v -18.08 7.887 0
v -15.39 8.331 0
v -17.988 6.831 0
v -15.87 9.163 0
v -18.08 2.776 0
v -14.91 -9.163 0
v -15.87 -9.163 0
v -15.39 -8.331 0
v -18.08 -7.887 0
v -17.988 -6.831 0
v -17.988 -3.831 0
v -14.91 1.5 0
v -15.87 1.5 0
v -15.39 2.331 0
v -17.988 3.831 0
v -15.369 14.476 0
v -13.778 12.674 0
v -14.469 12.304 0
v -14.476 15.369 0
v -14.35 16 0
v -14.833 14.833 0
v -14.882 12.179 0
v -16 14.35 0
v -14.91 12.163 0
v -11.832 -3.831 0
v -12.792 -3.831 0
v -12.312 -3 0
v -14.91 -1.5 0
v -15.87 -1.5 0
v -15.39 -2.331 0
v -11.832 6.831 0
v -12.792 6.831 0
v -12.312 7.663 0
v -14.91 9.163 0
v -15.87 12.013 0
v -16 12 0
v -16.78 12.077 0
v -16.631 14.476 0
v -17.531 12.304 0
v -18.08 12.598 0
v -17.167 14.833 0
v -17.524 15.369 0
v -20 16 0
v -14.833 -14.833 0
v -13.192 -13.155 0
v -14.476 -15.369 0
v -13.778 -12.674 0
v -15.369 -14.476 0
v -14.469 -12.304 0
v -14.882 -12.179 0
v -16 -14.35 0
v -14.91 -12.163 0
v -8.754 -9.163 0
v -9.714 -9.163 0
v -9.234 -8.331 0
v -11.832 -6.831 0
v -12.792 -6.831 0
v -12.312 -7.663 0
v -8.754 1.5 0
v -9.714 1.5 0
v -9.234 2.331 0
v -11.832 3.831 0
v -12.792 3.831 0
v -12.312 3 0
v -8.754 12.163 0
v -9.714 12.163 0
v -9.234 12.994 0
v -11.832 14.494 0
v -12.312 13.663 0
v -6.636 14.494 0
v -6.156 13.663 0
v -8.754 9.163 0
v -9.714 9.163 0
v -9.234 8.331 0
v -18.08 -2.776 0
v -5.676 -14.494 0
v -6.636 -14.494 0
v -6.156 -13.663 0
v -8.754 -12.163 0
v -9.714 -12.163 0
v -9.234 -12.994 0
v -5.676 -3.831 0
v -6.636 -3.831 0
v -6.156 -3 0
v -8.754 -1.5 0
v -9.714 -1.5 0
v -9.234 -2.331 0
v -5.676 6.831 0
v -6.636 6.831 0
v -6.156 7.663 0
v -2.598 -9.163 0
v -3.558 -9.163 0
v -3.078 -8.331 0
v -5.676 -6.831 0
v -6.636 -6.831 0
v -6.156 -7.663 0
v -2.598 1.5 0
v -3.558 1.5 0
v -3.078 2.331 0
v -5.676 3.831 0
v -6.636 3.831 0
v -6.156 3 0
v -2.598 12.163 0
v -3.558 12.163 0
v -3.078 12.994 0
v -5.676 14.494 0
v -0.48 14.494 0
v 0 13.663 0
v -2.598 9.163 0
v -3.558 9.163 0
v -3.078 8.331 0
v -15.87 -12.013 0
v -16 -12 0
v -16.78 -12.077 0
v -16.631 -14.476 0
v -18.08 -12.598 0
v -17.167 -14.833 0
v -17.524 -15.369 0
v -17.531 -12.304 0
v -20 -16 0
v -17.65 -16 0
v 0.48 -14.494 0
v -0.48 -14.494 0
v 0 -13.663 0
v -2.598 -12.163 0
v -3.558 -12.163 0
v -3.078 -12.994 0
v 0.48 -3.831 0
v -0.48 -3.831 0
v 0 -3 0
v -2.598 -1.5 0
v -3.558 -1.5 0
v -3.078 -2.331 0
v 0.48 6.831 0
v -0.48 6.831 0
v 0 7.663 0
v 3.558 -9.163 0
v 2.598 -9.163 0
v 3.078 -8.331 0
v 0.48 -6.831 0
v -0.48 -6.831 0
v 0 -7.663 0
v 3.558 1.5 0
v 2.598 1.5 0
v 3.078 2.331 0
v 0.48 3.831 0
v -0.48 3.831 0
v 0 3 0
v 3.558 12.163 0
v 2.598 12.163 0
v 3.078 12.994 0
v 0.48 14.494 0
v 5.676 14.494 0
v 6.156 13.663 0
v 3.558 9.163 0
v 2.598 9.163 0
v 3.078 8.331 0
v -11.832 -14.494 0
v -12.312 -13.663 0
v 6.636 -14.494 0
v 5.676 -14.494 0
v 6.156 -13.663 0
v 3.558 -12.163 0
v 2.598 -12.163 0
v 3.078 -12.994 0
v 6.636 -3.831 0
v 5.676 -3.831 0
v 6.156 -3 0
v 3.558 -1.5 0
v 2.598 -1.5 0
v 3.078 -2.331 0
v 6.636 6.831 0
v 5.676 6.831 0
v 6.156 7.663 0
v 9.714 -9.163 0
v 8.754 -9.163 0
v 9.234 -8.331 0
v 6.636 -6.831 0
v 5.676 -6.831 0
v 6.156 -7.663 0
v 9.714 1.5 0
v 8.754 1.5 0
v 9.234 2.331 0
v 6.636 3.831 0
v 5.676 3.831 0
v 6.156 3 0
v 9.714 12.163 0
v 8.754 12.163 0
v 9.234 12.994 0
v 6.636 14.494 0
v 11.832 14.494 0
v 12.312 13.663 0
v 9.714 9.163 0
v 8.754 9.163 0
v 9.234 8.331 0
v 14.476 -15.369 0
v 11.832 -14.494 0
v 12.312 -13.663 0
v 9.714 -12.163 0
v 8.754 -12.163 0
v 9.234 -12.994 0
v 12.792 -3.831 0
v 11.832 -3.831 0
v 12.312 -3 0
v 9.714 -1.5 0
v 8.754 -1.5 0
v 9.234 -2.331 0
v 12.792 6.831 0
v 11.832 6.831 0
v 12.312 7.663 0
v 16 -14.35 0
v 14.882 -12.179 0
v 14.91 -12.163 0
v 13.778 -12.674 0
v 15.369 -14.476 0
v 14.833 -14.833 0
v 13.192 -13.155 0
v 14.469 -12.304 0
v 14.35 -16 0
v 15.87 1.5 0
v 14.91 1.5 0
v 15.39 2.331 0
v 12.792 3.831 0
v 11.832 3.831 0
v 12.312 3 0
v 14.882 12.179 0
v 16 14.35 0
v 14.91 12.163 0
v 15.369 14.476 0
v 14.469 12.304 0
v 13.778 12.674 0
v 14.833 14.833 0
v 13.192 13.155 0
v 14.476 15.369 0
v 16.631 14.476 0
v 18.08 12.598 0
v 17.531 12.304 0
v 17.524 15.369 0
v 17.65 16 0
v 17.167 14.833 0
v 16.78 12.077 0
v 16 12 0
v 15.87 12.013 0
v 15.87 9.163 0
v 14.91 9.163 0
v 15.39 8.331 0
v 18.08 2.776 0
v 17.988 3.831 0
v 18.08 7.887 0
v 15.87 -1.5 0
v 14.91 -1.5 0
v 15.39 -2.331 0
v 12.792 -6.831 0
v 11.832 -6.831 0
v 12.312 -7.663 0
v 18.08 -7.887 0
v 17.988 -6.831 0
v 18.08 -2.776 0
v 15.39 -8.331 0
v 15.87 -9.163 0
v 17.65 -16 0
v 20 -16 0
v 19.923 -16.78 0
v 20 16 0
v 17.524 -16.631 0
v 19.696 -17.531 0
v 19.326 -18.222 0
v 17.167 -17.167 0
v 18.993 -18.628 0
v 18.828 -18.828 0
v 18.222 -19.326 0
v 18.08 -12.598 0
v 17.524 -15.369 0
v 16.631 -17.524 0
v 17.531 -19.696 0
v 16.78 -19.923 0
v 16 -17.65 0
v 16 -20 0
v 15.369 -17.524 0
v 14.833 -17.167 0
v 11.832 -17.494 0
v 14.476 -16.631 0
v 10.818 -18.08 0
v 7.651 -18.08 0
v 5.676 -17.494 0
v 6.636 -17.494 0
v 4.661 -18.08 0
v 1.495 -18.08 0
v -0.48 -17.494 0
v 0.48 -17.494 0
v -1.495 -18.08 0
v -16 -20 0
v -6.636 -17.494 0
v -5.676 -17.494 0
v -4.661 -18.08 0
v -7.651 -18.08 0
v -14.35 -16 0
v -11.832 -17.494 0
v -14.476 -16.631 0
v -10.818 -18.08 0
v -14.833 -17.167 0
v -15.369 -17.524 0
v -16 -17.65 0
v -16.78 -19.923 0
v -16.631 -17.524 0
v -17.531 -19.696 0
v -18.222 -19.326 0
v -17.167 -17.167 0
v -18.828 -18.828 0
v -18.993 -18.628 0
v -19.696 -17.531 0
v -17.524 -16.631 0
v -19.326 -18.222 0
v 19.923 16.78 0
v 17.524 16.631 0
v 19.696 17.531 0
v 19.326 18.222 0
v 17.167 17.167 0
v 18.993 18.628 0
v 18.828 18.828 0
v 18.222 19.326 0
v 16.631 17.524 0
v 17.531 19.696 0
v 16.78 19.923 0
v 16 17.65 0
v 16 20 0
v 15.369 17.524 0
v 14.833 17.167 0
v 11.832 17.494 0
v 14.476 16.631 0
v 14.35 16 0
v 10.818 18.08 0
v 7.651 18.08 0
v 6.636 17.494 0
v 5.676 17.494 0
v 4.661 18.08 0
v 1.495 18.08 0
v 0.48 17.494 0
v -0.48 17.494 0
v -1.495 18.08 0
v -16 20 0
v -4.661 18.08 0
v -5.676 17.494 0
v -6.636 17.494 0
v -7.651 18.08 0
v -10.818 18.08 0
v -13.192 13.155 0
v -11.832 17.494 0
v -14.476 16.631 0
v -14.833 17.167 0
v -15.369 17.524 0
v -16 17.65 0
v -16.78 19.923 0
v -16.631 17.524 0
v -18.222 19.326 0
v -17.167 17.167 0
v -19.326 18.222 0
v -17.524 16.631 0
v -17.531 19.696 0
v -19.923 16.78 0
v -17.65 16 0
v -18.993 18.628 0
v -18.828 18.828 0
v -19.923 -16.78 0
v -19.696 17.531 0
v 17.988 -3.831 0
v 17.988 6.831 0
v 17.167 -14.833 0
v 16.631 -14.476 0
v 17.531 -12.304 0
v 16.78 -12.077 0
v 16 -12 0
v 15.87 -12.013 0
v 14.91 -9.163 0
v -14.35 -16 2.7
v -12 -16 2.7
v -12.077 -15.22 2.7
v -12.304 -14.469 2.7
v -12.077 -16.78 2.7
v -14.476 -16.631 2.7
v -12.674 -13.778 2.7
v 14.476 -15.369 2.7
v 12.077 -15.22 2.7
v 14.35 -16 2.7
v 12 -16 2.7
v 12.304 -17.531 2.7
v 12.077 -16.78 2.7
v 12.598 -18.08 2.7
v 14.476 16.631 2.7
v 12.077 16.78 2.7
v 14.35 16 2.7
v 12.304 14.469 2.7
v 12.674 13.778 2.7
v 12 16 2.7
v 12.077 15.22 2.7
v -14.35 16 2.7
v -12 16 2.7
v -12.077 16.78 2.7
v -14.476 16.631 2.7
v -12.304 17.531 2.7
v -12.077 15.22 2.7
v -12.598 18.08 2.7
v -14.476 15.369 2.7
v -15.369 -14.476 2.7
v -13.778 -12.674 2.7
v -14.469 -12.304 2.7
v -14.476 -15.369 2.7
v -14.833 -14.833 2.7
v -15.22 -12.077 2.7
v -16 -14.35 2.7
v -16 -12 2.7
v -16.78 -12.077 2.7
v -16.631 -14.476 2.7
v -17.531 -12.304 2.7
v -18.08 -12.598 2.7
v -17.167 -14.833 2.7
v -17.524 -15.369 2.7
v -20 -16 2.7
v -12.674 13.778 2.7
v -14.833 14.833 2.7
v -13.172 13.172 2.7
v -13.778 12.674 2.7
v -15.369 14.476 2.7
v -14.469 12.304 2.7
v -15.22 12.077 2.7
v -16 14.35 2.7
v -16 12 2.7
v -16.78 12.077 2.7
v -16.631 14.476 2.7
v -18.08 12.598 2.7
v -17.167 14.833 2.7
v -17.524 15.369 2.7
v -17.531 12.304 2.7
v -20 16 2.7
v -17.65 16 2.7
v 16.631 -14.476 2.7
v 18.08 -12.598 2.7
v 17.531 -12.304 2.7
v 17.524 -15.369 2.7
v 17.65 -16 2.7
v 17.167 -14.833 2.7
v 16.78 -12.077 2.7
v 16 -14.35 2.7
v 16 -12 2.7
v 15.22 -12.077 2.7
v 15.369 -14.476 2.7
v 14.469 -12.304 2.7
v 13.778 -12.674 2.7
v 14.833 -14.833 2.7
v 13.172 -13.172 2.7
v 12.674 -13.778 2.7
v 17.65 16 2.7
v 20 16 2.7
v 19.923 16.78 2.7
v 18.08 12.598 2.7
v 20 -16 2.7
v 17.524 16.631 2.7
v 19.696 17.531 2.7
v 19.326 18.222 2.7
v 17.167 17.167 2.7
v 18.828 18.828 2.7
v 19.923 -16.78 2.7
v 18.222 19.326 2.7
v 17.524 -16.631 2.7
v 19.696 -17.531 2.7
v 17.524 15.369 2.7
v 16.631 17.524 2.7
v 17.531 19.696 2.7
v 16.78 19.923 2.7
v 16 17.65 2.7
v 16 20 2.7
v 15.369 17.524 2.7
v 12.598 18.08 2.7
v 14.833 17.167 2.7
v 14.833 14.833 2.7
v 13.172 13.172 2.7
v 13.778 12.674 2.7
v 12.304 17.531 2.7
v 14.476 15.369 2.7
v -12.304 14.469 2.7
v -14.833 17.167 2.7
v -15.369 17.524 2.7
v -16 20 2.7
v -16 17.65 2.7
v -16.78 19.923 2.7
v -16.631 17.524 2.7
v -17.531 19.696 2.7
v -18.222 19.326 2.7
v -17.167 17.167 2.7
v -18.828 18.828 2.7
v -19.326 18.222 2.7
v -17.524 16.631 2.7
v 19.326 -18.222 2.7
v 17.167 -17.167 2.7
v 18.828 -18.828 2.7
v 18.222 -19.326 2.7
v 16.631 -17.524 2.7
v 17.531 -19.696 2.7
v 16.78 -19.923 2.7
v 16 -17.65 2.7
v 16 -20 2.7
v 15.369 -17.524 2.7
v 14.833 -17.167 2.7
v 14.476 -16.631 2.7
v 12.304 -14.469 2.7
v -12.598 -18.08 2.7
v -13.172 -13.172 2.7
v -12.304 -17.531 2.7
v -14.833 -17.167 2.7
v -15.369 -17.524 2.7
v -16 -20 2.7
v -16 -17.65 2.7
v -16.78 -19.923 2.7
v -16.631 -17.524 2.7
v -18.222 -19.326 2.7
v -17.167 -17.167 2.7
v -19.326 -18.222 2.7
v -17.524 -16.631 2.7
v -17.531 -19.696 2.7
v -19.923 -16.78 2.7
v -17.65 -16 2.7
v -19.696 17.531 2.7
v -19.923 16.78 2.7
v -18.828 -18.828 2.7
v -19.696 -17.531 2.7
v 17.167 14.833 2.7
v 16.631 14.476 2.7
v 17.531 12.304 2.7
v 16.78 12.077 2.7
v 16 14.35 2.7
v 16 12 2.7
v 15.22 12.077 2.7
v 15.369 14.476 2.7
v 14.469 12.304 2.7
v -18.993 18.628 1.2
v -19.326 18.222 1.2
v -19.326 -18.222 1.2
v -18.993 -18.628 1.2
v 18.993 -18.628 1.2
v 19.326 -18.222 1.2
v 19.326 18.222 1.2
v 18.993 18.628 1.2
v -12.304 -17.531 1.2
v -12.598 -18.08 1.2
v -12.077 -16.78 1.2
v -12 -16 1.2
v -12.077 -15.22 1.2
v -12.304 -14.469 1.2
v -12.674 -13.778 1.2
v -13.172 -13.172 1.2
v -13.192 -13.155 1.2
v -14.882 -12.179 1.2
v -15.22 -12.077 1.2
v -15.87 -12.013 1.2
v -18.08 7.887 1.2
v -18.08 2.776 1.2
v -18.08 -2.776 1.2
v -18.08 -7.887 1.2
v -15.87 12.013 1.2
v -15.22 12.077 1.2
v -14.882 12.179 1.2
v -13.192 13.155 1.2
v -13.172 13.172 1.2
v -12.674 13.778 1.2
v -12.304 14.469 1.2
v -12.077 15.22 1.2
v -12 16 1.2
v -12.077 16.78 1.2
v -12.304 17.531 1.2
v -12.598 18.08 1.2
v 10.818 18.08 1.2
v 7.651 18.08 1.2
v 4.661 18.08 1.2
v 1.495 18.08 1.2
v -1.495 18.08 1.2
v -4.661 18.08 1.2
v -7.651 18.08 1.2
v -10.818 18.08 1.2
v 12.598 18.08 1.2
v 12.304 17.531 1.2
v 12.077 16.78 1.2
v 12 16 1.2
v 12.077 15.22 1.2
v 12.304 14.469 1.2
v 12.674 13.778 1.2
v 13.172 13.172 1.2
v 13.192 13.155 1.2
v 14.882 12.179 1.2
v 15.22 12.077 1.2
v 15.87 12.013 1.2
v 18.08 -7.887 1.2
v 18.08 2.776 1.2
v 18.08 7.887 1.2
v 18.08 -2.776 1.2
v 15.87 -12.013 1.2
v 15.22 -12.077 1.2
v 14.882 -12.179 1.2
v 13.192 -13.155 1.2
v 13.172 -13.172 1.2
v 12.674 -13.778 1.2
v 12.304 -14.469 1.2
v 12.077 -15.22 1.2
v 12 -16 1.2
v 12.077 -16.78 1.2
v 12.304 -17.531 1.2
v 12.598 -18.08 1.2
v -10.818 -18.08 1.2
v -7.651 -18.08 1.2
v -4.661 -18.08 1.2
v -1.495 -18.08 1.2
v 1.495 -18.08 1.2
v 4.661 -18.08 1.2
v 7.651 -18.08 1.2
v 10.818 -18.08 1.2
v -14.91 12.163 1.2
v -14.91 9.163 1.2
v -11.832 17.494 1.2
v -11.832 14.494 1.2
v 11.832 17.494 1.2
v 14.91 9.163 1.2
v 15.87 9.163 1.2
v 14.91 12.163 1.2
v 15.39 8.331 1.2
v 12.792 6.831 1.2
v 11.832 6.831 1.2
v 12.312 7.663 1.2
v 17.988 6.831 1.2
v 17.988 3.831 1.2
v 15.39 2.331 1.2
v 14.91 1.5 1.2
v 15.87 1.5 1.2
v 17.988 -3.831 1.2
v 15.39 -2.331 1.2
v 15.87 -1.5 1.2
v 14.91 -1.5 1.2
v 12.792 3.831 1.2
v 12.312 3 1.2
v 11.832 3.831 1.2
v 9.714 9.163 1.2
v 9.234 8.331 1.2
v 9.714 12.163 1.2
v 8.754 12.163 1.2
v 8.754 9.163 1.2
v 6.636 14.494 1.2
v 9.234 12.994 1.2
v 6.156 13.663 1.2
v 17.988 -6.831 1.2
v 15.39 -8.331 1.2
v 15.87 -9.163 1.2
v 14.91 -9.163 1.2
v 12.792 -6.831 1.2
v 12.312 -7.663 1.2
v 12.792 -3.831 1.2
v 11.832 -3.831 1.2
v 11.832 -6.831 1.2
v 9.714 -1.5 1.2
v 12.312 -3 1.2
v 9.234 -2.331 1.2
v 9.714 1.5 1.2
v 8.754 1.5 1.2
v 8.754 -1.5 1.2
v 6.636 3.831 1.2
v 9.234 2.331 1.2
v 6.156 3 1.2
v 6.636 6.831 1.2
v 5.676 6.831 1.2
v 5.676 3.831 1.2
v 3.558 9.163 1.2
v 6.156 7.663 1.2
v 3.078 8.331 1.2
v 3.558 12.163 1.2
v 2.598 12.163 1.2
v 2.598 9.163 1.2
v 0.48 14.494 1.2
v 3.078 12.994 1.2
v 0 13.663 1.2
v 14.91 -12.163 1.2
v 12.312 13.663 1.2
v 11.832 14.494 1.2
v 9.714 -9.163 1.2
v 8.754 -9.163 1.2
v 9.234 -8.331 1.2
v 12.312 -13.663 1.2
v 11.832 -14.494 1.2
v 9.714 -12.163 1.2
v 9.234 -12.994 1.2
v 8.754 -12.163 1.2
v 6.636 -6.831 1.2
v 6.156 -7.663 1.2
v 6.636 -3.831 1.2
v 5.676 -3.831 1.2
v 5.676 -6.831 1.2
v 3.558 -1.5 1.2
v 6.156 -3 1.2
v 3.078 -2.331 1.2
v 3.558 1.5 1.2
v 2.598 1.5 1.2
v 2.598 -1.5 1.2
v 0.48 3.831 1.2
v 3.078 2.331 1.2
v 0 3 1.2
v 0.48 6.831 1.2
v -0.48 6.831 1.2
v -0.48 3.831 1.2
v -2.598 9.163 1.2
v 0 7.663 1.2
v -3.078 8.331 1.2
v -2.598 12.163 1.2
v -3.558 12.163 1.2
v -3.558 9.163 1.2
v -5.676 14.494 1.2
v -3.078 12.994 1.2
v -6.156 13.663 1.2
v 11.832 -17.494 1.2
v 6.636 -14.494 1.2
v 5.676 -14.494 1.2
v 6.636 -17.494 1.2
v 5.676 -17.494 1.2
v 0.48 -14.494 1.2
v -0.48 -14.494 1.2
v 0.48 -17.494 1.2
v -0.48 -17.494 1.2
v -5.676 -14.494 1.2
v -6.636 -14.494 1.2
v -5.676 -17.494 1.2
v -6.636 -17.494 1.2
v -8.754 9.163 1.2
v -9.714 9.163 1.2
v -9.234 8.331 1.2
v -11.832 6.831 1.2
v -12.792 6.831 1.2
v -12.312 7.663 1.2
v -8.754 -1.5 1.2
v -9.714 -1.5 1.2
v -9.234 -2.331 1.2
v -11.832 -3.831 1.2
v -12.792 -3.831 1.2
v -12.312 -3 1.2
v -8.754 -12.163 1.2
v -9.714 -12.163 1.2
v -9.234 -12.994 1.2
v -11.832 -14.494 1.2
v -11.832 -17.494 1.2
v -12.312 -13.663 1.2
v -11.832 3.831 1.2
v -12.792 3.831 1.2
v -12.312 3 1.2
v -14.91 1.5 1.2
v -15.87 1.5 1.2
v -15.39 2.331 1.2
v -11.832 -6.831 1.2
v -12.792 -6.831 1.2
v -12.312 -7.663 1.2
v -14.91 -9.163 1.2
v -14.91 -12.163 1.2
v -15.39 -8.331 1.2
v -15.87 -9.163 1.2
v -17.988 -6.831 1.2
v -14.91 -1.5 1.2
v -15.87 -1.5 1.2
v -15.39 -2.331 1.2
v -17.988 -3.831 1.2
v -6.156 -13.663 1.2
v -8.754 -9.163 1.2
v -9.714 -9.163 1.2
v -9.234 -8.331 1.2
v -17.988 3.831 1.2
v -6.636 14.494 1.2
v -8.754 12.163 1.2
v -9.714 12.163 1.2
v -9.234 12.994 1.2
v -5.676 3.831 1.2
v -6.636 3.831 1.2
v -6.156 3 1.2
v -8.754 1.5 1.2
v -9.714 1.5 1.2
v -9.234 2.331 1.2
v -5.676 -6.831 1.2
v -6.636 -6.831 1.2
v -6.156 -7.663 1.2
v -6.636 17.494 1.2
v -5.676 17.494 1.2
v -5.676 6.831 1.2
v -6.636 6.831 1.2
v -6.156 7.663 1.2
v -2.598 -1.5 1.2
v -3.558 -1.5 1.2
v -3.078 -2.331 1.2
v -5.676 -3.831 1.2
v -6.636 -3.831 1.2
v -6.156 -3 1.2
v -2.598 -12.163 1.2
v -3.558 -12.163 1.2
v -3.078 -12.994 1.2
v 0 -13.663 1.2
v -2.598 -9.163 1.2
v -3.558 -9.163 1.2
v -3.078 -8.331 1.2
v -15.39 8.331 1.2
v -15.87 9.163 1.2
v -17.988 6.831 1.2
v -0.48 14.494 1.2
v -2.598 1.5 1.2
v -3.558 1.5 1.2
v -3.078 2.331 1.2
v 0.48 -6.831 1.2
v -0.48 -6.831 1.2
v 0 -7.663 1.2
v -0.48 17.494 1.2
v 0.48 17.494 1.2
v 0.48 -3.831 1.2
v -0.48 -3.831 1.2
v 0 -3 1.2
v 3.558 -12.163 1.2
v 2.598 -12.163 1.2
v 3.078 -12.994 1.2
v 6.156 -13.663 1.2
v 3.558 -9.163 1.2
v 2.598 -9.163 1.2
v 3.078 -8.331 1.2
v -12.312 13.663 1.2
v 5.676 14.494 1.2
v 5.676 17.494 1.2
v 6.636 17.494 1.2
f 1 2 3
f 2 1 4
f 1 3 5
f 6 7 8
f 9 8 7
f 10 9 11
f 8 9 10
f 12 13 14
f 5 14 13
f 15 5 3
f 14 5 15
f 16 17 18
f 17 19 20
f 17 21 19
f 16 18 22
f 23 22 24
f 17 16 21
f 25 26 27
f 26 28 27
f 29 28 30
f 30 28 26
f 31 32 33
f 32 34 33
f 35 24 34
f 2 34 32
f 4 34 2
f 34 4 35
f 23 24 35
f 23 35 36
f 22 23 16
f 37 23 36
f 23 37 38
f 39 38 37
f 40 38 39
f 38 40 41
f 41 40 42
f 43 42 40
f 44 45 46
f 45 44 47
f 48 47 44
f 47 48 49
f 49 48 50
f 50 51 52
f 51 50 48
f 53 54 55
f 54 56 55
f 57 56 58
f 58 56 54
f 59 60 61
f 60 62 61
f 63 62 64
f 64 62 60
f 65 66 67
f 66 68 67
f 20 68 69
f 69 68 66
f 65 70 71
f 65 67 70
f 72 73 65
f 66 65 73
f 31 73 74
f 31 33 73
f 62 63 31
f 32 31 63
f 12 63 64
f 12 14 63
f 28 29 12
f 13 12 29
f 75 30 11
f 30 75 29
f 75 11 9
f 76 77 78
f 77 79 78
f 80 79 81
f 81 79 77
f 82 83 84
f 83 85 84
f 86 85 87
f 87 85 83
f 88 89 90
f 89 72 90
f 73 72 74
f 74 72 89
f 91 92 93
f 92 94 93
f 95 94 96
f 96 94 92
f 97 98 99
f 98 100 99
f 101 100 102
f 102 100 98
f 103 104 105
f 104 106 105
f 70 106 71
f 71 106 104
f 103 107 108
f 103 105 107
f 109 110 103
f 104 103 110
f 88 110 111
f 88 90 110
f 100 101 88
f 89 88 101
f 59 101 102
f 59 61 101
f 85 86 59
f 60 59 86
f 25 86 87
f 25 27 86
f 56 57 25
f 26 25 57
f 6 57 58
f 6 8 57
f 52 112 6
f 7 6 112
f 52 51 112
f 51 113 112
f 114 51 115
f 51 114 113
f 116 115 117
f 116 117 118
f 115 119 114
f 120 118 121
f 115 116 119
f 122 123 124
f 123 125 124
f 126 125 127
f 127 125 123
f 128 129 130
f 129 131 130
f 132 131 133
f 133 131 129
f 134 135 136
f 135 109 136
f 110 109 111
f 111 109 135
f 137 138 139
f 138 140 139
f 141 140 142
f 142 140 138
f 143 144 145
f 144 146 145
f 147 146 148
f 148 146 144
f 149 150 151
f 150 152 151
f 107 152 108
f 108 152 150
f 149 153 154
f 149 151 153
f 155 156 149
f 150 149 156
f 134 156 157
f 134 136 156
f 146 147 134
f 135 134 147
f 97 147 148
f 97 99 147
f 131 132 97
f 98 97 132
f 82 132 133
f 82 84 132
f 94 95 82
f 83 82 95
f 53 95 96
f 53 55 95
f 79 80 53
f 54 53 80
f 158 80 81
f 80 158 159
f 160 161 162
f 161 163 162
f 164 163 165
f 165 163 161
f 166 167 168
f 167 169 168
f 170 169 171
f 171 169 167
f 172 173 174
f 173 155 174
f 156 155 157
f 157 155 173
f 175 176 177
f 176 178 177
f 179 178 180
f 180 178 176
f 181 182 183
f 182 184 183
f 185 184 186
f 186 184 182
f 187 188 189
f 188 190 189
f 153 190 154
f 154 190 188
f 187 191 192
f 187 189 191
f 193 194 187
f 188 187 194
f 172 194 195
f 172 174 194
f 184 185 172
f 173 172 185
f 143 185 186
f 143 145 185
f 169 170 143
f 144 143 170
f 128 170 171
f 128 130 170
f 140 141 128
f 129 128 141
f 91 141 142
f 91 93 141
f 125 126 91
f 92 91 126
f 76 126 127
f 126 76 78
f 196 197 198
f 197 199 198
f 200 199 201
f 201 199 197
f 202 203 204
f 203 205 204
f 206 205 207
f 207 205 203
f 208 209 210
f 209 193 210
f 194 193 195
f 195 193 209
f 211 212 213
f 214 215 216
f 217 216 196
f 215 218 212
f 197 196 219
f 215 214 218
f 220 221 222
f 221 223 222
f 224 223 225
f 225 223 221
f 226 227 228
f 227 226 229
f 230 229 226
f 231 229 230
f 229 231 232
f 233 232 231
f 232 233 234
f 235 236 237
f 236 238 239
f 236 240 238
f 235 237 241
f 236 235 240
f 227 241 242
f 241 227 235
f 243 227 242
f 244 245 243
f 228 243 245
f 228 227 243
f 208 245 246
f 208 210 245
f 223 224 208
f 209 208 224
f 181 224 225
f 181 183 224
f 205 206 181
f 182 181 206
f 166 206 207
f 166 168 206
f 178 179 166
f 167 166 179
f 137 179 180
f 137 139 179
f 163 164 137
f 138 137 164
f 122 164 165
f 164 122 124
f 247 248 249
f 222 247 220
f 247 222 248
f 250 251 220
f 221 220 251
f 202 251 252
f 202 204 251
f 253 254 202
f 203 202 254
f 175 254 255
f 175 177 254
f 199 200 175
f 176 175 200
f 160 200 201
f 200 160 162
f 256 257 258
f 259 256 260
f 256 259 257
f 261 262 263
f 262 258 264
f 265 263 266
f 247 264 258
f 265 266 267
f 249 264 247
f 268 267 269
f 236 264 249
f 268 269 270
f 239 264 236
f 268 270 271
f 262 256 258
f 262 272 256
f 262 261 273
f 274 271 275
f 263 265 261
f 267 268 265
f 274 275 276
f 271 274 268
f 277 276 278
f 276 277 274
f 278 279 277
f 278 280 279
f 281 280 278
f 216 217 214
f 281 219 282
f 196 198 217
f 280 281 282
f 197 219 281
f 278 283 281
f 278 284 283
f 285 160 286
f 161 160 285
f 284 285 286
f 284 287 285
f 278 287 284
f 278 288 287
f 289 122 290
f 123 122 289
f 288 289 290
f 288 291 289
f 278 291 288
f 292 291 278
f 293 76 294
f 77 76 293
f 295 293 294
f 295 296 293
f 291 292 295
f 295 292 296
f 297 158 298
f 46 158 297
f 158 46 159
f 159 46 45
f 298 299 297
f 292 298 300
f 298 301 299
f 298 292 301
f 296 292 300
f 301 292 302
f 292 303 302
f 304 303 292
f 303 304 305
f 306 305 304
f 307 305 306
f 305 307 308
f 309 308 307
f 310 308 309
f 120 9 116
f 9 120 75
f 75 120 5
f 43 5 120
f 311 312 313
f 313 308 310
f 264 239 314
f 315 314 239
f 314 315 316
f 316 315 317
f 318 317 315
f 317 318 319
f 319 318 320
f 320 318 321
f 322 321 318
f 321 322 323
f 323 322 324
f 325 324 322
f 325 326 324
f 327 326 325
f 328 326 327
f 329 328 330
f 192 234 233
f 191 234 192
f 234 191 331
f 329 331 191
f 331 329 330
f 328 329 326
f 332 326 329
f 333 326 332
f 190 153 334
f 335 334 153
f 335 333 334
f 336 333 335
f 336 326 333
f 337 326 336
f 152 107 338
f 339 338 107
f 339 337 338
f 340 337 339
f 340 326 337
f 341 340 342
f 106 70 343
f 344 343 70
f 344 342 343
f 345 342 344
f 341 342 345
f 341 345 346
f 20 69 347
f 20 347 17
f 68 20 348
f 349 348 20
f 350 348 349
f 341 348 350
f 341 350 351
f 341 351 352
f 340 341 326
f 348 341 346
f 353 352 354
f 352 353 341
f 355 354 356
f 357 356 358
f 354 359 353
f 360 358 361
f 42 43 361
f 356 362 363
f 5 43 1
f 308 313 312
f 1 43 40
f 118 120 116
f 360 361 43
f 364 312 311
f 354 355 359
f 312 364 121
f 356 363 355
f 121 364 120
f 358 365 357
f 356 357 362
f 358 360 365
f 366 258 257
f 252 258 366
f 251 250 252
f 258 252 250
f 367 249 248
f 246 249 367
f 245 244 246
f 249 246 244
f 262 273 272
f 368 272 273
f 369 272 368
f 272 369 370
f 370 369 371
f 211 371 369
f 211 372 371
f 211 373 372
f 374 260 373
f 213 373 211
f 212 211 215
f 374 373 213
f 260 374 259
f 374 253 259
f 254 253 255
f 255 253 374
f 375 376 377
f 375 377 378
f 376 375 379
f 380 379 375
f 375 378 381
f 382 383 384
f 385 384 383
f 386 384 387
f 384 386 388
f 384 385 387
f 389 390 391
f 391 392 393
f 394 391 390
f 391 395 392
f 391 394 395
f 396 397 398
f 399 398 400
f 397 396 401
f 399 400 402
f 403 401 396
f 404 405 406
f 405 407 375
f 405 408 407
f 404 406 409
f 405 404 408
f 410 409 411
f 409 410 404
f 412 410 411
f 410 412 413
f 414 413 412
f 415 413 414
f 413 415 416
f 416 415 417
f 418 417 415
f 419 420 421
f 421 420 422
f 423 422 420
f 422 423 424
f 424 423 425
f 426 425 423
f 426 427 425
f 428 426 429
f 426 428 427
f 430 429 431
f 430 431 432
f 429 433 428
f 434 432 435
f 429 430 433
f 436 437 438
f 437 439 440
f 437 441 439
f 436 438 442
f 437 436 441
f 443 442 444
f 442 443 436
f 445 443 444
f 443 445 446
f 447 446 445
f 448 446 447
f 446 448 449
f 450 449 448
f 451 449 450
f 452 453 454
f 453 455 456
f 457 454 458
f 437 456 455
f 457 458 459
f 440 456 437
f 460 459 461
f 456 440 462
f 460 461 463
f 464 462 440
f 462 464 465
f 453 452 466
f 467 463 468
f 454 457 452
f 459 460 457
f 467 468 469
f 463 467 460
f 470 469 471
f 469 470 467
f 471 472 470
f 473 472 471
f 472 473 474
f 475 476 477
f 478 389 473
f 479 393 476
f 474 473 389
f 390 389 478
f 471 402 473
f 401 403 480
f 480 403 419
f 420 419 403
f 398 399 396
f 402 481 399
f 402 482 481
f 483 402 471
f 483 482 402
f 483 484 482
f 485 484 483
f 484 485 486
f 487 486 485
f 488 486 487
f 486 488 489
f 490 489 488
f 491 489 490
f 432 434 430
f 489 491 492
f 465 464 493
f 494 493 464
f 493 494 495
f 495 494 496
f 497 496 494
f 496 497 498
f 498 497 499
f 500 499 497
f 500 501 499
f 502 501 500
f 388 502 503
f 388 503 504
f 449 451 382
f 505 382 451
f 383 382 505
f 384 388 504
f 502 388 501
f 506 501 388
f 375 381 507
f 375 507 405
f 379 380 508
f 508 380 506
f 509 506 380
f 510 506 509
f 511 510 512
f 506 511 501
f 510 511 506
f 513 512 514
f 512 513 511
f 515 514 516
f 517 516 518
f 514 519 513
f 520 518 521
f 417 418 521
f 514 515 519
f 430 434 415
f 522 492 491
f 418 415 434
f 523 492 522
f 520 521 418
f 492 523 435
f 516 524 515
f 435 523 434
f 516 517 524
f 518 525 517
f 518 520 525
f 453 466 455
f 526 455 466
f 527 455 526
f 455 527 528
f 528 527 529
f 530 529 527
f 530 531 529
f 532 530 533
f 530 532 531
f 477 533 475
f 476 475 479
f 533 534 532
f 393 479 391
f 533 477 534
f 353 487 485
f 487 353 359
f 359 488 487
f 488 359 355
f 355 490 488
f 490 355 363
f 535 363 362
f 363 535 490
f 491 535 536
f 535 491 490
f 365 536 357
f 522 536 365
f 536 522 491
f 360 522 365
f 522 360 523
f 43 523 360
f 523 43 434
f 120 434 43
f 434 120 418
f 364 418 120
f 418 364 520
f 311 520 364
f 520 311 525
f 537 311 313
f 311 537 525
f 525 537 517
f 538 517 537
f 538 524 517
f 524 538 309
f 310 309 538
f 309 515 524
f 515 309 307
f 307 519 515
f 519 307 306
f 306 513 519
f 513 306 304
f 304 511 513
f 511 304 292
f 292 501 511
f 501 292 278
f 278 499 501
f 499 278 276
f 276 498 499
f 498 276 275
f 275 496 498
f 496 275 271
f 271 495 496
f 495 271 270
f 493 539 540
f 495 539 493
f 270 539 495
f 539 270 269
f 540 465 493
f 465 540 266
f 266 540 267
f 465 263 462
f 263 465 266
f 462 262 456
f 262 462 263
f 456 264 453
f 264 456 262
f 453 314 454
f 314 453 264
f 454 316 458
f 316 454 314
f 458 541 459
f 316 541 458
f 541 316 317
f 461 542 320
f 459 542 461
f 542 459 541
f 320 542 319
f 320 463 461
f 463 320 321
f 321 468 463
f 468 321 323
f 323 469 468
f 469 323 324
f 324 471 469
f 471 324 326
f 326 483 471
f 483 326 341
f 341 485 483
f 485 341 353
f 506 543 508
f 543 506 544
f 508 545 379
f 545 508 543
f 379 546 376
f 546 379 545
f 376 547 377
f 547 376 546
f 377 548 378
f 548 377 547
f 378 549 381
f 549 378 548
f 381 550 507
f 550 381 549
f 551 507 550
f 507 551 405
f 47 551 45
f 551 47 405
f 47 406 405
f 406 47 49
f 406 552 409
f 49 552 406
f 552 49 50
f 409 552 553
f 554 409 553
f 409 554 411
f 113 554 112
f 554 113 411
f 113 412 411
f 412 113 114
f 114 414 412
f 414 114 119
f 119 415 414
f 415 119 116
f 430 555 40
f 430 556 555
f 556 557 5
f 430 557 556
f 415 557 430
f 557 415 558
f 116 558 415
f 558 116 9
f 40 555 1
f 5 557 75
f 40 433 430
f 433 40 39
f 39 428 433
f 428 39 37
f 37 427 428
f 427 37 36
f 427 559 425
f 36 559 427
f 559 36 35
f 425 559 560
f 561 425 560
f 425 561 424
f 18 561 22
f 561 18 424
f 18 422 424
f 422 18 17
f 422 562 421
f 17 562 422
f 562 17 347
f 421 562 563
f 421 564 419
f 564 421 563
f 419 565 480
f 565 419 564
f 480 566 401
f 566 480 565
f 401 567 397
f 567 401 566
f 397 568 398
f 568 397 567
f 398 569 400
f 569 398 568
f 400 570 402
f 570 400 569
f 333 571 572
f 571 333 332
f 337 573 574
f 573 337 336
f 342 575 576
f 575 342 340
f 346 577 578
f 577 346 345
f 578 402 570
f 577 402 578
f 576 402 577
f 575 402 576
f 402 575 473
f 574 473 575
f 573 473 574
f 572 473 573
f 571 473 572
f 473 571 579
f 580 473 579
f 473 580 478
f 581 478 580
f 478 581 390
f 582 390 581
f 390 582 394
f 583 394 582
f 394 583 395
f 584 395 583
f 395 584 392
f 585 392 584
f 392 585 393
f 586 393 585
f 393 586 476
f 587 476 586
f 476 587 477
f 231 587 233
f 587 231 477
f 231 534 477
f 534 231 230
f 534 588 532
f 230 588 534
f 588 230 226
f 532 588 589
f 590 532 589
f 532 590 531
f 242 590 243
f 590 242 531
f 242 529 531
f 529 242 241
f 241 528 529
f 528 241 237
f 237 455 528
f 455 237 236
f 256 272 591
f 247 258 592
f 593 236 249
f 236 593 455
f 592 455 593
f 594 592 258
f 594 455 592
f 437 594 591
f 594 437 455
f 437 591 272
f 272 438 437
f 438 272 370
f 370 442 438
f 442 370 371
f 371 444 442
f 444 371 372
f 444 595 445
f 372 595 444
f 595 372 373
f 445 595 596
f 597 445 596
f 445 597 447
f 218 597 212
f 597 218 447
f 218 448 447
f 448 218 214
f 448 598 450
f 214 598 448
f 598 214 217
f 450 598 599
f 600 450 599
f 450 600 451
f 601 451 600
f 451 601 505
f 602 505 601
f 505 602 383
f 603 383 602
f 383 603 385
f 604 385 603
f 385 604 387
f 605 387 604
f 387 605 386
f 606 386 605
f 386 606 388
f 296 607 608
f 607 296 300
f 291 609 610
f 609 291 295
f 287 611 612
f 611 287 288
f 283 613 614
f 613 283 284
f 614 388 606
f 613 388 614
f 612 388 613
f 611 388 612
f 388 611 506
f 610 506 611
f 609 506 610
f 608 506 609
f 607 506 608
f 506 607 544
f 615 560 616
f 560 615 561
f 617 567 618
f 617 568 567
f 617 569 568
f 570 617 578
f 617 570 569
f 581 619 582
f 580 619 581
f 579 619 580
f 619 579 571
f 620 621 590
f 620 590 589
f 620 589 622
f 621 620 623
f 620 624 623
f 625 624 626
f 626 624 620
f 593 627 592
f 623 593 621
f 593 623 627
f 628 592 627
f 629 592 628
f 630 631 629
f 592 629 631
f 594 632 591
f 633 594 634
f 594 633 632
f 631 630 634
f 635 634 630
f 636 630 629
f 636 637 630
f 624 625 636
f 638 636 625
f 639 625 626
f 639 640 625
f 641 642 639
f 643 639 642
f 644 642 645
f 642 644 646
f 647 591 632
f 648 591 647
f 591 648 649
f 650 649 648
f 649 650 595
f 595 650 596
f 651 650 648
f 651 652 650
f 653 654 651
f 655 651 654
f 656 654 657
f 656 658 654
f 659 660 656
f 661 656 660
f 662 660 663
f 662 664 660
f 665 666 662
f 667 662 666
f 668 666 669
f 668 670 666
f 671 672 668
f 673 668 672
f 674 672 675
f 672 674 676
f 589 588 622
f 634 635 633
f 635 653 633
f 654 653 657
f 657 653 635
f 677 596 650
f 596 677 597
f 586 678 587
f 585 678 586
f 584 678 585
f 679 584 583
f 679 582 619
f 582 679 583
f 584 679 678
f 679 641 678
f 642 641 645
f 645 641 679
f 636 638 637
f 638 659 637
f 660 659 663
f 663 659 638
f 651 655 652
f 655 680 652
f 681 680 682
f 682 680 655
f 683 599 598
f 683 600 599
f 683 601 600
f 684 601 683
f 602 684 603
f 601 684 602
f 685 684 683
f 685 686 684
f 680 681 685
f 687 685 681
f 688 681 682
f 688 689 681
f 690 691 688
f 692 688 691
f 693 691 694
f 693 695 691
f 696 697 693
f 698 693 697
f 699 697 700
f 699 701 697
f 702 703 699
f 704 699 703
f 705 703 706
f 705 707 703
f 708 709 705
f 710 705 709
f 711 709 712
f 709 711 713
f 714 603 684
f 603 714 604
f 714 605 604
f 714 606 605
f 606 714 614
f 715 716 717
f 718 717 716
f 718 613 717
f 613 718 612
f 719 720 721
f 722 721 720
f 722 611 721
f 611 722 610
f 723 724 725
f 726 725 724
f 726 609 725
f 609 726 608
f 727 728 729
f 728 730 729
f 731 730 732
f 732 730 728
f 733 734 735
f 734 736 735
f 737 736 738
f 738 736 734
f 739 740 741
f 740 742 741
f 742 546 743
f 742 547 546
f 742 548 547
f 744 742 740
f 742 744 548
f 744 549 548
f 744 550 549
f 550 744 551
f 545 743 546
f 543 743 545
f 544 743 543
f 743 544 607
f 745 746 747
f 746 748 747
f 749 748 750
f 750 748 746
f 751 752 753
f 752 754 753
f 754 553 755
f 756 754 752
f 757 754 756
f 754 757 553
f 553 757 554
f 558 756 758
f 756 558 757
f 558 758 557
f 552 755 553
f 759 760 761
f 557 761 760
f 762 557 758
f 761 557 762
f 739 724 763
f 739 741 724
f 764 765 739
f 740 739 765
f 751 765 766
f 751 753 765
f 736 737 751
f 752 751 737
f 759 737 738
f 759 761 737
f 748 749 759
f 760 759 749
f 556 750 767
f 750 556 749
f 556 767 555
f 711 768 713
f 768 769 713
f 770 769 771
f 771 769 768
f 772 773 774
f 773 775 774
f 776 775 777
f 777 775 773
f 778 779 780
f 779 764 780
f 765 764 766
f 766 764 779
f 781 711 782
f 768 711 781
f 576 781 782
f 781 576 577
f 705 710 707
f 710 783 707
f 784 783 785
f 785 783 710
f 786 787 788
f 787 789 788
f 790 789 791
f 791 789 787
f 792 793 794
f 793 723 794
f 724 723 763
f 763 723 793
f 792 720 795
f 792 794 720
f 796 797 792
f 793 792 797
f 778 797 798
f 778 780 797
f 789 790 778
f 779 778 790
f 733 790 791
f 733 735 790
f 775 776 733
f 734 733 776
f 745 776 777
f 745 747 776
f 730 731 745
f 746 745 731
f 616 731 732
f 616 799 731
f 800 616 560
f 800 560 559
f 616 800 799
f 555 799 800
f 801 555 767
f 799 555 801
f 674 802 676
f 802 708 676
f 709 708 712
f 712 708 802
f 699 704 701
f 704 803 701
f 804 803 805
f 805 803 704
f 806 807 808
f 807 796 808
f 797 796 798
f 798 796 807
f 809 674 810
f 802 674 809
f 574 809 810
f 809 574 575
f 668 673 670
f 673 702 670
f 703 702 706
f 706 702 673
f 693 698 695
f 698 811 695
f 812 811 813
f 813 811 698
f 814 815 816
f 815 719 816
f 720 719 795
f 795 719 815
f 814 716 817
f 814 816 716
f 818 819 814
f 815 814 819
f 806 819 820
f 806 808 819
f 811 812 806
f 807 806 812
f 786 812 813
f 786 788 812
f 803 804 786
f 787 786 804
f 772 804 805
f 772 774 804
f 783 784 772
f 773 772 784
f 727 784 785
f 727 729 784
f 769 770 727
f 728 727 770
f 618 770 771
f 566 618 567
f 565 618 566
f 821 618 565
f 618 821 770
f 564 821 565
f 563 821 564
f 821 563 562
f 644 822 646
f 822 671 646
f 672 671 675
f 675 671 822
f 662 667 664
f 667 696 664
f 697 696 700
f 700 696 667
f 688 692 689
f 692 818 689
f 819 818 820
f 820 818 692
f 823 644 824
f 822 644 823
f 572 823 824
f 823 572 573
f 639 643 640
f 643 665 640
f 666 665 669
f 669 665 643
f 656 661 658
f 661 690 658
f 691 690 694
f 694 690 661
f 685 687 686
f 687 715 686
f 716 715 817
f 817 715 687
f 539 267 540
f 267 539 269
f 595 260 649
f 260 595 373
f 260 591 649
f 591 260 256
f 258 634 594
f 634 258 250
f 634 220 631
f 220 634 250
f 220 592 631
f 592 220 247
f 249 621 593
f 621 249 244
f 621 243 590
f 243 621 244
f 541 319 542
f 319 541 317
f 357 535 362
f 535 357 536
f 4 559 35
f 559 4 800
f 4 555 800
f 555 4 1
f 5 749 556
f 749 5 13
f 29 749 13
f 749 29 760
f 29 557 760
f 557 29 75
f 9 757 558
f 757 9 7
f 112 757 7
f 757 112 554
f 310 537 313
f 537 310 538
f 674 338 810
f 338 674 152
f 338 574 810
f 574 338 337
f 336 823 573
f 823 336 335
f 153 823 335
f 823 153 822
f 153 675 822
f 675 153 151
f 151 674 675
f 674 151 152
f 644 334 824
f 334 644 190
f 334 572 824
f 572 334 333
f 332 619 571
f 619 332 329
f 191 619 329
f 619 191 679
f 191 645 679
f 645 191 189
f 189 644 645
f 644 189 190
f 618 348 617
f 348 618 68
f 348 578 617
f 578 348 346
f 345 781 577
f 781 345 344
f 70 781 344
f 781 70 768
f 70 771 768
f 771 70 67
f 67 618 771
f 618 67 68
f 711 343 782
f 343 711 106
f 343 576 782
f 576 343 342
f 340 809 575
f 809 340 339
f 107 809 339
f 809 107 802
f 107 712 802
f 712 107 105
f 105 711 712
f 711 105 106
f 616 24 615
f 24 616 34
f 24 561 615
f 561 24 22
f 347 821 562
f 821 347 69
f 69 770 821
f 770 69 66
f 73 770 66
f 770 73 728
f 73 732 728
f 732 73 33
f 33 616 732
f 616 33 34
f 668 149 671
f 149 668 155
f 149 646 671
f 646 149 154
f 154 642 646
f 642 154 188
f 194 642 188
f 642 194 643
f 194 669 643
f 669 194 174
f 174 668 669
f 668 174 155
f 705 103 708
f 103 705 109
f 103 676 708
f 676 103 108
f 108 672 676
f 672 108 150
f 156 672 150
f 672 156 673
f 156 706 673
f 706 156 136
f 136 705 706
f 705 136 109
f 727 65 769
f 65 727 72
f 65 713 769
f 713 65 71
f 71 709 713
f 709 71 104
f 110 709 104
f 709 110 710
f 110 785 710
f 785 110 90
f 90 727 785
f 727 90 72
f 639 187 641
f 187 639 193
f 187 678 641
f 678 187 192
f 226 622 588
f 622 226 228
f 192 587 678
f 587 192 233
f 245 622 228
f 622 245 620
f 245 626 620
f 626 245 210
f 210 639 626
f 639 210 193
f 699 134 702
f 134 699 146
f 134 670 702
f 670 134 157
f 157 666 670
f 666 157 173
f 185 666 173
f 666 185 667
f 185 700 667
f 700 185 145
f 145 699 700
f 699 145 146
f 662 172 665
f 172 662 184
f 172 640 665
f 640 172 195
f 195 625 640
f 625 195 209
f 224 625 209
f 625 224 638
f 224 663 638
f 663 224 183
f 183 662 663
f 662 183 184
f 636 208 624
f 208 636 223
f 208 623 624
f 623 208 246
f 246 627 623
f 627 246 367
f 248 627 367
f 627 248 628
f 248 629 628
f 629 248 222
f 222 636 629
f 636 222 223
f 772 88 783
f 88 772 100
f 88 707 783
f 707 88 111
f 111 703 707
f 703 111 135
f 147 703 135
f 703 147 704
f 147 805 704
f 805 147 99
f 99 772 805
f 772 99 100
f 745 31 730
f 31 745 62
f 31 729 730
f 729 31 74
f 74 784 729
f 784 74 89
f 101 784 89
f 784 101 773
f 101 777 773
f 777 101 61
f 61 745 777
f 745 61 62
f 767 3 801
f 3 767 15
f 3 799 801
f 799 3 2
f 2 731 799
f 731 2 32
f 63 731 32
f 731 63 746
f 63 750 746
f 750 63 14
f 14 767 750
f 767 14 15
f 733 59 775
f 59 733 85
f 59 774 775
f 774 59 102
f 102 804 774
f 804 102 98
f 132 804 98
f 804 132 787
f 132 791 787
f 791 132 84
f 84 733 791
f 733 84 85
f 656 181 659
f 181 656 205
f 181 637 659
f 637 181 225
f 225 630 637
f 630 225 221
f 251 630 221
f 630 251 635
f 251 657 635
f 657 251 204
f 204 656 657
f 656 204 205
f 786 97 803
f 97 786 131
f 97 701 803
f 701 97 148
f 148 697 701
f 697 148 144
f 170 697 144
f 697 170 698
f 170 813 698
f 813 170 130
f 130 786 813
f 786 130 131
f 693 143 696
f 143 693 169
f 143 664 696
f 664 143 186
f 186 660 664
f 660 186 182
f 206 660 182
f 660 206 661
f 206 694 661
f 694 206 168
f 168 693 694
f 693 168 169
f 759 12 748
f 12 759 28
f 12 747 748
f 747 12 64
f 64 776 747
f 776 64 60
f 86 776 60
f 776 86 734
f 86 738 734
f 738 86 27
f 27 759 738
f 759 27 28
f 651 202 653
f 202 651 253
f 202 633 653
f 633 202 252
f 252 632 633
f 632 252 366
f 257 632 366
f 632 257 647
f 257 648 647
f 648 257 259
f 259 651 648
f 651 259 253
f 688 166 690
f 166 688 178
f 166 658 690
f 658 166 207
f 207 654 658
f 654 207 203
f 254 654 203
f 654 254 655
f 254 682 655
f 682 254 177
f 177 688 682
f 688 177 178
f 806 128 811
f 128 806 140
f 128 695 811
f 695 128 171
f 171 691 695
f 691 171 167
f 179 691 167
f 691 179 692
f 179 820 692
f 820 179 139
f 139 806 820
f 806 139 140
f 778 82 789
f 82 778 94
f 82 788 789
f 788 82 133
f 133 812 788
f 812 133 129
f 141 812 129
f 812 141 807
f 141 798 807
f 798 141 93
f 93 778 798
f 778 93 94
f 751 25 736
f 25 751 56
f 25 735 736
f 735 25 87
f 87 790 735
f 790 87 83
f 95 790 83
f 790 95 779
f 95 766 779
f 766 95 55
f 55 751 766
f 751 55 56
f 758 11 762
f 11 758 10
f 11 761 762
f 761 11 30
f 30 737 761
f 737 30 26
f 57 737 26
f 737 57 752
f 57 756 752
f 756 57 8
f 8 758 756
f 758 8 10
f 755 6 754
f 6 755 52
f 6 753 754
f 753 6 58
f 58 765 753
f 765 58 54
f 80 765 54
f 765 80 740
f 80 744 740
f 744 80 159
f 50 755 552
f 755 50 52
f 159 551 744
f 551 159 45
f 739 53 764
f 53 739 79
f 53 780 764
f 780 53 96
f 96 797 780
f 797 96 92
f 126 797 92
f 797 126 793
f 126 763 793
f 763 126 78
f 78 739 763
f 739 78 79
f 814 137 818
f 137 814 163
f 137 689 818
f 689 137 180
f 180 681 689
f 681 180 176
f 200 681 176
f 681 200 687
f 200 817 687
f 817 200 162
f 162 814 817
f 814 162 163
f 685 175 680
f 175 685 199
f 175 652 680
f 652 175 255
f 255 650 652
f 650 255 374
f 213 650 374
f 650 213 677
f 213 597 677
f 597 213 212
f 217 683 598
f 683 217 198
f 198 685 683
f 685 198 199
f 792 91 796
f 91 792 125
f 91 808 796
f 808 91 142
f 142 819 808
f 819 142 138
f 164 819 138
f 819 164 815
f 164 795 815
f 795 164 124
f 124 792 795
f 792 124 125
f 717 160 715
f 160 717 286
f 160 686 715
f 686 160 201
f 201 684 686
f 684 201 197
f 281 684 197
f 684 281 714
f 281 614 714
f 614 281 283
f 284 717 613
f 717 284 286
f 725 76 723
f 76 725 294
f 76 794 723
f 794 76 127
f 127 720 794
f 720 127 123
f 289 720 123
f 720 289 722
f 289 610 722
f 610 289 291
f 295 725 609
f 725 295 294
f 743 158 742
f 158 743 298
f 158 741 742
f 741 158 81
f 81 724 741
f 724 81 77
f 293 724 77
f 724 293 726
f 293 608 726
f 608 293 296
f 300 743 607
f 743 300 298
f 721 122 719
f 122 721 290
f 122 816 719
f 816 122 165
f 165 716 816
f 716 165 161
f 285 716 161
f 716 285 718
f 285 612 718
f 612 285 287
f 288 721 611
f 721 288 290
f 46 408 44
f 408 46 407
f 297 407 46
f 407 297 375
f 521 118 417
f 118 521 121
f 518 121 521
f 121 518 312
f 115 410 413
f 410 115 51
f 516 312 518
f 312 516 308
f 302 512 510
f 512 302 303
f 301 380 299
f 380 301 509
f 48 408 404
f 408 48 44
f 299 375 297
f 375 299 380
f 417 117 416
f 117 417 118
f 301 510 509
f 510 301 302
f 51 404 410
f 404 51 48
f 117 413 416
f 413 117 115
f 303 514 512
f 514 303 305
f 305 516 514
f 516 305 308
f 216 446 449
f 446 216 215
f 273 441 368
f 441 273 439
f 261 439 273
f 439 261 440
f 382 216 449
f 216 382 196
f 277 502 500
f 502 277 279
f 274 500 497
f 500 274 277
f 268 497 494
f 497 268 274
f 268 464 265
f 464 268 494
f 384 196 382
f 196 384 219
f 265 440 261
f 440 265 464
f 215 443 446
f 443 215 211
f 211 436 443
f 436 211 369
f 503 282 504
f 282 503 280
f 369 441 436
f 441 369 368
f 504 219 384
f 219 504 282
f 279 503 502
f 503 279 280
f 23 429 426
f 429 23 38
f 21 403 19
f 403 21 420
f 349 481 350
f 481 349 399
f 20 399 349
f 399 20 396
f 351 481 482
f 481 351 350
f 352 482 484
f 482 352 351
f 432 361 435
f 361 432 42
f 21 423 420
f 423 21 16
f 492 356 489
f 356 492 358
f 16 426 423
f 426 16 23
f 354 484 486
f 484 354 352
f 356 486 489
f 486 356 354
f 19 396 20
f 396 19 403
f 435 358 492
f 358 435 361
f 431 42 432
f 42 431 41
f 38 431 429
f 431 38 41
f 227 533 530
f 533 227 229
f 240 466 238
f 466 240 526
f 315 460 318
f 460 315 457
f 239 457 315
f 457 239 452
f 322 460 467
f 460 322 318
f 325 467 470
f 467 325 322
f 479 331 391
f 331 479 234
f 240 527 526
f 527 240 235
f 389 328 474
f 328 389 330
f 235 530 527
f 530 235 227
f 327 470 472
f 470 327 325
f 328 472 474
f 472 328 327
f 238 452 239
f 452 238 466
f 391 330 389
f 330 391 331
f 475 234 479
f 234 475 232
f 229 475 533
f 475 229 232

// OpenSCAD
/*
 * Customizable Fan Cover - https://www.thingiverse.com/thing:2802474
 * by Dennis Hofmann - https://www.thingiverse.com/mightynozzle/about
 * created 2018-02-22
 * updated 2018-03-27
 * version v1.2
 *
 * Changelog
 * --------------
 * v1.2:
 *      - better quality of rounded corners and crosshair pattern
 * v1.1:
 *      - added support line option for crosshair and square pattern
 * v1.0:
 *      - final design
 * --------------
 *
 * This work is licensed under the Creative Commons - Attribution - Non-Commercial - ShareAlike license.
 * https://creativecommons.org/licenses/by-nc-sa/3.0/
 */


 // Parameter Section //
//-------------------//

/* [Global Settings] */

// Choose between presets of known and common fan sizes.
fan_preset = "40"; //[25:25mm,30:30mm,40:40mm,50:50mm,60:60mm,70:70mm,80:80mm,92:92mm,120:120mm,140:140mm,custom:Custom Fan Settings]

// If you want save to save about 40% filament and about 20% printing time, you can choose the reduced frame option.
frame_option = "reduced"; //[full,reduced]

// Minimum Border Size. I recommend to use two/four/six... times of your line width setting of your slicer. Simplify3D uses 0.48mm line width by default if you are using a 0.4mm nozzle. Cura uses 0.4mm line width.
min_border_size_in_millimeter = 1.92;

// Choose between a grill pattern
grill_pattern = "honeycomb"; //[honeycomb,grid,line,triangle,crosshair,square,dot,aperture]

// Set the angle of the pattern around the center of the cover.
grill_pattern_rotation = 0; //[0:5:360]

// Size of the pattern lines. I recommend to use two/four/six... times of your line width setting of your slicer. Simplify3D uses 0.48mm line width by default if you are using a 0.4mm nozzle. Cura uses 0.4mm line width.
line_size_in_millimter = 0.96; //[0.3:0.02:4]

// Space between two lines of your pattern. If you choose aperture pattern, this value set the size of the center octagon.
line_space_in_millimeter = 6; //[1:0.1:50]

// If you need countersunk holes, you can activate it here. Bottom = first layer. Top = last layer. 
screw_hole_chamfer = "no"; //[no,top,bottom,top_and_bottom]

// Activate or deactivate rounded corners. The radius will be automatically calculated.
rounded_corners = "yes"; //[yes,no]

// number of straight lines supporting the crosshair or square pattern.
number_of_support_lines = 2;  //[1:1:36]

/* [Custom Fan Settings] */

// Cover size. E.g. 80 for a 80mm Fan
cover_size_in_millimeter = 40;

// E.g. 2.9 for M2.5, 3.3 for M3, 4.4 for M4
screw_hole_diameter_in_millimeter = 3.3;

// 25mm fan: 20 | 30mm fan: 24 | 40mm fan: 32 | 50mm fan: 40 | 60mm fan: 50 | 70mm fan: 61.5 | 80mm fan: 71.5 | 92mm fan: 82.5 | 120mm fan: 105 | 140mm fan: 126 
screw_hole_distance_in_millimeter = 32;

// Height of the outer frame of the cover
cover_height_in_millimeter = 3;

// Height of the pattern inside the cover frame
grill_pattern_height_in_millimeter = 1;

/* [Hidden] */
min_border_size = min_border_size_in_millimeter;
line_size = line_size_in_millimter;
line_space = line_space_in_millimeter;

 // Program Section //
//-----------------//

if(fan_preset == "25") {
    fan_cover(cover_size = 25, screw_hole_dia = 2.9, screw_hole_distance = 20, cover_h = 2, grill_pattern_h = 1);
}
if(fan_preset == "30") {
    fan_cover(cover_size = 30, screw_hole_dia = 3.3, screw_hole_distance = 24, cover_h = 2.5, grill_pattern_h = 1.1);
}
if(fan_preset == "40") {
    fan_cover(cover_size = 40, screw_hole_dia = 3.3, screw_hole_distance = 32, cover_h = 2.7, grill_pattern_h = 1.2);
}
if(fan_preset == "50") {
    fan_cover(cover_size = 50, screw_hole_dia = 4.4, screw_hole_distance = 40, cover_h = 2.9, grill_pattern_h = 1.3);
}
if(fan_preset == "60") {
    fan_cover(cover_size = 60, screw_hole_dia = 4.4, screw_hole_distance = 50, cover_h = 3, grill_pattern_h = 1.3);
}
if(fan_preset == "70") {
    fan_cover(cover_size = 70, screw_hole_dia = 4.4, screw_hole_distance = 61.5, cover_h = 3, grill_pattern_h = 1.4);
}
if(fan_preset == "80") {
    fan_cover(cover_size = 80, screw_hole_dia = 4.4, screw_hole_distance = 71.5, cover_h = 3.2, grill_pattern_h = 1.5);
}
if(fan_preset == "92") {
    fan_cover(cover_size = 92, screw_hole_dia = 4.4, screw_hole_distance = 82.5, cover_h = 3.5, grill_pattern_h = 1.6);
}
if(fan_preset == "120") {
    fan_cover(cover_size = 120, screw_hole_dia = 4.4, screw_hole_distance = 105, cover_h = 4, grill_pattern_h = 1.8);
}
if(fan_preset == "140") {
    fan_cover(cover_size = 140, screw_hole_dia = 4.4, screw_hole_distance = 126, cover_h = 4.5, grill_pattern_h = 2.0);
}
if(fan_preset == "custom") {
    fan_cover(cover_size = cover_size_in_millimeter, screw_hole_dia = screw_hole_diameter_in_millimeter, screw_hole_distance = screw_hole_distance_in_millimeter, cover_h = cover_height_in_millimeter, grill_pattern_h = grill_pattern_height_in_millimeter);
}


 // Module Section //
//----------------//

module fan_cover(cover_size, screw_hole_dia, screw_hole_distance, cover_h, grill_pattern_h) {
    corner_size = cover_size - screw_hole_distance;
    corner_r = rounded_corners == "yes" ? corner_size / 2 : 0;
    screw_pos = (cover_size - corner_size) / 2;
    color("DodgerBlue") difference() {
        union() {
            linear_extrude(height = cover_h, convexity = 20) {
                difference() {
                    offset(r=corner_r, $fn = ceil(corner_r * 8)) {
                        offset(r=-corner_r) {
                            square([cover_size, cover_size], center = true);
                        }
                    }
                    if(frame_option == "reduced") {
                        offset(r=corner_r, $fn = ceil(corner_r * 8)) {
                            offset(r=-corner_r) {
                                square([cover_size - min_border_size*2, cover_size - min_border_size*2], center = true);
                            }
                        }
                    }
                    if(frame_option == "full") {
                        circle(d = cover_size - min_border_size * 2, $fn = cover_size);
                    }
                } 
                if(frame_option == "reduced") {
                    for(y = [-1:2:1]) {
                        for(x = [-1:2:1]) {
                            translate([screw_pos * x, screw_pos * y, -2]) {
                                circle(d = corner_size, $fn = ceil(corner_r * 8));
                            }
                        }
                    }
                }
            }
            linear_extrude(height = grill_pattern_h, convexity = 20) {
                intersection() {
                    offset(r=corner_r, $fn = ceil(corner_r * 8)) {
                        offset(r=-corner_r) {
                            square([cover_size, cover_size], center = true);
                        }
                    }
                    rotate(grill_pattern_rotation) {
                        if(grill_pattern == "honeycomb") {
                            honeycomb_pattern(cover_size, line_size, line_space);
                        }
                        if(grill_pattern == "grid") {
                            grid_pattern(cover_size, line_size, line_space);
                        }
                        if(grill_pattern == "line") {
                            line_pattern(cover_size, line_size, line_space);
                        }
                        if(grill_pattern == "triangle") {
                            triangle_pattern(cover_size, line_size, line_space);
                        }
                        if(grill_pattern == "crosshair") {
                            crosshair_pattern(cover_size, line_size, line_space);
                        }
                        if(grill_pattern == "square") {
                            square_pattern(cover_size, line_size, line_space);
                        }
                        if(grill_pattern == "dot") {
                            dot_pattern(cover_size, line_size, line_space);
                        }
                        if(grill_pattern == "aperture") {
                            aperture_pattern(cover_size, line_size, line_space);
                        }
                        
                    }
                }
            }
        }
        for(y = [-1:2:1]) {
            for(x = [-1:2:1]) {
                translate([screw_pos * x, screw_pos * y, -2]) {
                    screw_hole(cover_h, screw_hole_dia);
                }
            }
        }
    }
}

module screw_hole(cover_h, screw_hole_dia) {
    cylinder(h = cover_h + 4, d = screw_hole_dia, $fn = 16);
    if(screw_hole_chamfer == "bottom" || screw_hole_chamfer == "top_and_bottom") {
        translate([0, 0, 2.9 - screw_hole_dia]) {
            cylinder(h = screw_hole_dia, d1 = screw_hole_dia * 4, d2 = screw_hole_dia);
        }
    }
    if(screw_hole_chamfer == "top" || screw_hole_chamfer == "top_and_bottom") {
        translate([0, 0, cover_h + screw_hole_dia/4]) {
            cylinder(h = screw_hole_dia, d2 = screw_hole_dia * 4, d1 = screw_hole_dia);
        }
    }
}

module grid_pattern(size, line_size, line_space) {
    num = ceil(size / (line_size + line_space) * 1.42);
    for(x = [floor(-num / 2) : ceil(num / 2)]) {
        translate([x * (line_size + line_space), 0]) {
            square([line_size, num *(line_size + line_space)], center=true);
        }
        rotate(90) {
            translate([x * (line_size + line_space), 0]) {
                square([line_size, num *(line_size + line_space)], center = true);
            }
        }
    }
}

module triangle_pattern(size, line_size, line_space) {
    num = ceil(size / (line_size + line_space) * 1.42);
    for(x = [floor(-num / 2):ceil(num / 2)]) {
        translate([x * (line_size + line_space), 0]) {
            square([line_size, num *(line_size + line_space)], center = true);
        }
        rotate(60) {
            translate([x * (line_size + line_space), 0]) {
                square([line_size, num *(line_size + line_space)], center = true);
            }
        }
        rotate(120) {
            translate([x * (line_size + line_space), 0]) {
                square([line_size, num *(line_size + line_space)], center = true);
            }
        }
    }
}

module line_pattern(size, line_size, line_space) {
    num = ceil(size / (line_size + line_space)*1.42);
    for(x = [floor(-num / 2):ceil(num / 2)]) {
        translate([x * (line_size + line_space), 0]) {
            square([line_size, num *(line_size + line_space)], center=true);
        }
    }
}

module crosshair_pattern(size, line_size, line_space) {
    line = (line_size + line_space) * 2;
    num = ceil(size / line * 1.42);
    for(n = [1:num]) {
        difference() {
            circle(d = n * line + line_size * 2, $fn = ceil(n * line + line_size * 2));
            circle(d = n * line, $fn = ceil(n * line + line_size * 2));
        }
    }
    for(rot=[0:90 / number_of_support_lines * 2:180]) {
        rotate(rot + 45) square([size * 2, line_size], center = true);
    }
}

module square_pattern(size, line_size, line_space) {
    line = (line_size + line_space) * 2;
    num = ceil(size / line * 1.42); 
    for(n = [1:num]) {
        difference() {
            square([n * line + line_size * 2, n * line + line_size * 2], center = true);
            square([n * line, n * line], center = true);
        }
    }
    for(rot=[0:90 / number_of_support_lines * 2:180]) {
        rotate(rot + 45) square([size * 2, line_size], center = true);
    }
}

module honeycomb_pattern(size, line_size, line_space) {
    min_rad = (line_space / 2 * sqrt(3)) / 2 + line_size / 2;
    y_offset = sqrt(min_rad * min_rad * 4 - min_rad * min_rad);
    num_x = ceil(size / min_rad / 2) * 1.42;
    num_y = ceil(size / y_offset) * 1.42;
    difference() {
        square([size * 1.42, size * 1.42], center = true);
        for(y = [floor(-num_y / 2) : ceil(num_y / 2)]) {
            odd = (y % 2 == 0) ? 0 : min_rad;
            for(x = [floor(-num_x / 2) : ceil(num_x / 2)]) {
                translate([x * min_rad * 2 + odd, y * y_offset]) {
                    rotate(30) {
                        circle(d=line_space, $fn=6);
                    }
                }
            }
        }
    }
}

module dot_pattern(size, line_size, line_space) {
    rad = line_space / 2;
    y_offset = sqrt((rad + line_size / 2) * (rad + line_size / 2) * 4 - (rad + line_size / 2) * (rad + line_size / 2));
    num_x = ceil(size / rad / 2) * 1.42;
    num_y = ceil(size / y_offset) * 1.42;
    difference() {
        square([size * 1.42, size * 1.42], center = true);
        for(y = [floor(-num_y / 2) : ceil(num_y / 2)]) {
            odd = (y % 2 == 0) ? 0 : rad + line_size / 2;
            for(x = [floor(-num_x / 2) : ceil(num_x / 2)]) {
                translate([x * (rad + line_size / 2) * 2 + odd, y * y_offset]) {
                    rotate(30) {
                        circle(d=line_space);
                    }
                }
            }
        }
    }
}

module aperture_pattern(size, line_size, line_space) {
    circle(d = line_space, $fn = 8);
    for(rot = [1:2:15]) {
        rotate(360 / 16 * rot) {
            translate([line_space / 2 * cos(360 / 16) - line_size, -line_size]) {
                square([line_size, size]);
            }
        }
    }
}
